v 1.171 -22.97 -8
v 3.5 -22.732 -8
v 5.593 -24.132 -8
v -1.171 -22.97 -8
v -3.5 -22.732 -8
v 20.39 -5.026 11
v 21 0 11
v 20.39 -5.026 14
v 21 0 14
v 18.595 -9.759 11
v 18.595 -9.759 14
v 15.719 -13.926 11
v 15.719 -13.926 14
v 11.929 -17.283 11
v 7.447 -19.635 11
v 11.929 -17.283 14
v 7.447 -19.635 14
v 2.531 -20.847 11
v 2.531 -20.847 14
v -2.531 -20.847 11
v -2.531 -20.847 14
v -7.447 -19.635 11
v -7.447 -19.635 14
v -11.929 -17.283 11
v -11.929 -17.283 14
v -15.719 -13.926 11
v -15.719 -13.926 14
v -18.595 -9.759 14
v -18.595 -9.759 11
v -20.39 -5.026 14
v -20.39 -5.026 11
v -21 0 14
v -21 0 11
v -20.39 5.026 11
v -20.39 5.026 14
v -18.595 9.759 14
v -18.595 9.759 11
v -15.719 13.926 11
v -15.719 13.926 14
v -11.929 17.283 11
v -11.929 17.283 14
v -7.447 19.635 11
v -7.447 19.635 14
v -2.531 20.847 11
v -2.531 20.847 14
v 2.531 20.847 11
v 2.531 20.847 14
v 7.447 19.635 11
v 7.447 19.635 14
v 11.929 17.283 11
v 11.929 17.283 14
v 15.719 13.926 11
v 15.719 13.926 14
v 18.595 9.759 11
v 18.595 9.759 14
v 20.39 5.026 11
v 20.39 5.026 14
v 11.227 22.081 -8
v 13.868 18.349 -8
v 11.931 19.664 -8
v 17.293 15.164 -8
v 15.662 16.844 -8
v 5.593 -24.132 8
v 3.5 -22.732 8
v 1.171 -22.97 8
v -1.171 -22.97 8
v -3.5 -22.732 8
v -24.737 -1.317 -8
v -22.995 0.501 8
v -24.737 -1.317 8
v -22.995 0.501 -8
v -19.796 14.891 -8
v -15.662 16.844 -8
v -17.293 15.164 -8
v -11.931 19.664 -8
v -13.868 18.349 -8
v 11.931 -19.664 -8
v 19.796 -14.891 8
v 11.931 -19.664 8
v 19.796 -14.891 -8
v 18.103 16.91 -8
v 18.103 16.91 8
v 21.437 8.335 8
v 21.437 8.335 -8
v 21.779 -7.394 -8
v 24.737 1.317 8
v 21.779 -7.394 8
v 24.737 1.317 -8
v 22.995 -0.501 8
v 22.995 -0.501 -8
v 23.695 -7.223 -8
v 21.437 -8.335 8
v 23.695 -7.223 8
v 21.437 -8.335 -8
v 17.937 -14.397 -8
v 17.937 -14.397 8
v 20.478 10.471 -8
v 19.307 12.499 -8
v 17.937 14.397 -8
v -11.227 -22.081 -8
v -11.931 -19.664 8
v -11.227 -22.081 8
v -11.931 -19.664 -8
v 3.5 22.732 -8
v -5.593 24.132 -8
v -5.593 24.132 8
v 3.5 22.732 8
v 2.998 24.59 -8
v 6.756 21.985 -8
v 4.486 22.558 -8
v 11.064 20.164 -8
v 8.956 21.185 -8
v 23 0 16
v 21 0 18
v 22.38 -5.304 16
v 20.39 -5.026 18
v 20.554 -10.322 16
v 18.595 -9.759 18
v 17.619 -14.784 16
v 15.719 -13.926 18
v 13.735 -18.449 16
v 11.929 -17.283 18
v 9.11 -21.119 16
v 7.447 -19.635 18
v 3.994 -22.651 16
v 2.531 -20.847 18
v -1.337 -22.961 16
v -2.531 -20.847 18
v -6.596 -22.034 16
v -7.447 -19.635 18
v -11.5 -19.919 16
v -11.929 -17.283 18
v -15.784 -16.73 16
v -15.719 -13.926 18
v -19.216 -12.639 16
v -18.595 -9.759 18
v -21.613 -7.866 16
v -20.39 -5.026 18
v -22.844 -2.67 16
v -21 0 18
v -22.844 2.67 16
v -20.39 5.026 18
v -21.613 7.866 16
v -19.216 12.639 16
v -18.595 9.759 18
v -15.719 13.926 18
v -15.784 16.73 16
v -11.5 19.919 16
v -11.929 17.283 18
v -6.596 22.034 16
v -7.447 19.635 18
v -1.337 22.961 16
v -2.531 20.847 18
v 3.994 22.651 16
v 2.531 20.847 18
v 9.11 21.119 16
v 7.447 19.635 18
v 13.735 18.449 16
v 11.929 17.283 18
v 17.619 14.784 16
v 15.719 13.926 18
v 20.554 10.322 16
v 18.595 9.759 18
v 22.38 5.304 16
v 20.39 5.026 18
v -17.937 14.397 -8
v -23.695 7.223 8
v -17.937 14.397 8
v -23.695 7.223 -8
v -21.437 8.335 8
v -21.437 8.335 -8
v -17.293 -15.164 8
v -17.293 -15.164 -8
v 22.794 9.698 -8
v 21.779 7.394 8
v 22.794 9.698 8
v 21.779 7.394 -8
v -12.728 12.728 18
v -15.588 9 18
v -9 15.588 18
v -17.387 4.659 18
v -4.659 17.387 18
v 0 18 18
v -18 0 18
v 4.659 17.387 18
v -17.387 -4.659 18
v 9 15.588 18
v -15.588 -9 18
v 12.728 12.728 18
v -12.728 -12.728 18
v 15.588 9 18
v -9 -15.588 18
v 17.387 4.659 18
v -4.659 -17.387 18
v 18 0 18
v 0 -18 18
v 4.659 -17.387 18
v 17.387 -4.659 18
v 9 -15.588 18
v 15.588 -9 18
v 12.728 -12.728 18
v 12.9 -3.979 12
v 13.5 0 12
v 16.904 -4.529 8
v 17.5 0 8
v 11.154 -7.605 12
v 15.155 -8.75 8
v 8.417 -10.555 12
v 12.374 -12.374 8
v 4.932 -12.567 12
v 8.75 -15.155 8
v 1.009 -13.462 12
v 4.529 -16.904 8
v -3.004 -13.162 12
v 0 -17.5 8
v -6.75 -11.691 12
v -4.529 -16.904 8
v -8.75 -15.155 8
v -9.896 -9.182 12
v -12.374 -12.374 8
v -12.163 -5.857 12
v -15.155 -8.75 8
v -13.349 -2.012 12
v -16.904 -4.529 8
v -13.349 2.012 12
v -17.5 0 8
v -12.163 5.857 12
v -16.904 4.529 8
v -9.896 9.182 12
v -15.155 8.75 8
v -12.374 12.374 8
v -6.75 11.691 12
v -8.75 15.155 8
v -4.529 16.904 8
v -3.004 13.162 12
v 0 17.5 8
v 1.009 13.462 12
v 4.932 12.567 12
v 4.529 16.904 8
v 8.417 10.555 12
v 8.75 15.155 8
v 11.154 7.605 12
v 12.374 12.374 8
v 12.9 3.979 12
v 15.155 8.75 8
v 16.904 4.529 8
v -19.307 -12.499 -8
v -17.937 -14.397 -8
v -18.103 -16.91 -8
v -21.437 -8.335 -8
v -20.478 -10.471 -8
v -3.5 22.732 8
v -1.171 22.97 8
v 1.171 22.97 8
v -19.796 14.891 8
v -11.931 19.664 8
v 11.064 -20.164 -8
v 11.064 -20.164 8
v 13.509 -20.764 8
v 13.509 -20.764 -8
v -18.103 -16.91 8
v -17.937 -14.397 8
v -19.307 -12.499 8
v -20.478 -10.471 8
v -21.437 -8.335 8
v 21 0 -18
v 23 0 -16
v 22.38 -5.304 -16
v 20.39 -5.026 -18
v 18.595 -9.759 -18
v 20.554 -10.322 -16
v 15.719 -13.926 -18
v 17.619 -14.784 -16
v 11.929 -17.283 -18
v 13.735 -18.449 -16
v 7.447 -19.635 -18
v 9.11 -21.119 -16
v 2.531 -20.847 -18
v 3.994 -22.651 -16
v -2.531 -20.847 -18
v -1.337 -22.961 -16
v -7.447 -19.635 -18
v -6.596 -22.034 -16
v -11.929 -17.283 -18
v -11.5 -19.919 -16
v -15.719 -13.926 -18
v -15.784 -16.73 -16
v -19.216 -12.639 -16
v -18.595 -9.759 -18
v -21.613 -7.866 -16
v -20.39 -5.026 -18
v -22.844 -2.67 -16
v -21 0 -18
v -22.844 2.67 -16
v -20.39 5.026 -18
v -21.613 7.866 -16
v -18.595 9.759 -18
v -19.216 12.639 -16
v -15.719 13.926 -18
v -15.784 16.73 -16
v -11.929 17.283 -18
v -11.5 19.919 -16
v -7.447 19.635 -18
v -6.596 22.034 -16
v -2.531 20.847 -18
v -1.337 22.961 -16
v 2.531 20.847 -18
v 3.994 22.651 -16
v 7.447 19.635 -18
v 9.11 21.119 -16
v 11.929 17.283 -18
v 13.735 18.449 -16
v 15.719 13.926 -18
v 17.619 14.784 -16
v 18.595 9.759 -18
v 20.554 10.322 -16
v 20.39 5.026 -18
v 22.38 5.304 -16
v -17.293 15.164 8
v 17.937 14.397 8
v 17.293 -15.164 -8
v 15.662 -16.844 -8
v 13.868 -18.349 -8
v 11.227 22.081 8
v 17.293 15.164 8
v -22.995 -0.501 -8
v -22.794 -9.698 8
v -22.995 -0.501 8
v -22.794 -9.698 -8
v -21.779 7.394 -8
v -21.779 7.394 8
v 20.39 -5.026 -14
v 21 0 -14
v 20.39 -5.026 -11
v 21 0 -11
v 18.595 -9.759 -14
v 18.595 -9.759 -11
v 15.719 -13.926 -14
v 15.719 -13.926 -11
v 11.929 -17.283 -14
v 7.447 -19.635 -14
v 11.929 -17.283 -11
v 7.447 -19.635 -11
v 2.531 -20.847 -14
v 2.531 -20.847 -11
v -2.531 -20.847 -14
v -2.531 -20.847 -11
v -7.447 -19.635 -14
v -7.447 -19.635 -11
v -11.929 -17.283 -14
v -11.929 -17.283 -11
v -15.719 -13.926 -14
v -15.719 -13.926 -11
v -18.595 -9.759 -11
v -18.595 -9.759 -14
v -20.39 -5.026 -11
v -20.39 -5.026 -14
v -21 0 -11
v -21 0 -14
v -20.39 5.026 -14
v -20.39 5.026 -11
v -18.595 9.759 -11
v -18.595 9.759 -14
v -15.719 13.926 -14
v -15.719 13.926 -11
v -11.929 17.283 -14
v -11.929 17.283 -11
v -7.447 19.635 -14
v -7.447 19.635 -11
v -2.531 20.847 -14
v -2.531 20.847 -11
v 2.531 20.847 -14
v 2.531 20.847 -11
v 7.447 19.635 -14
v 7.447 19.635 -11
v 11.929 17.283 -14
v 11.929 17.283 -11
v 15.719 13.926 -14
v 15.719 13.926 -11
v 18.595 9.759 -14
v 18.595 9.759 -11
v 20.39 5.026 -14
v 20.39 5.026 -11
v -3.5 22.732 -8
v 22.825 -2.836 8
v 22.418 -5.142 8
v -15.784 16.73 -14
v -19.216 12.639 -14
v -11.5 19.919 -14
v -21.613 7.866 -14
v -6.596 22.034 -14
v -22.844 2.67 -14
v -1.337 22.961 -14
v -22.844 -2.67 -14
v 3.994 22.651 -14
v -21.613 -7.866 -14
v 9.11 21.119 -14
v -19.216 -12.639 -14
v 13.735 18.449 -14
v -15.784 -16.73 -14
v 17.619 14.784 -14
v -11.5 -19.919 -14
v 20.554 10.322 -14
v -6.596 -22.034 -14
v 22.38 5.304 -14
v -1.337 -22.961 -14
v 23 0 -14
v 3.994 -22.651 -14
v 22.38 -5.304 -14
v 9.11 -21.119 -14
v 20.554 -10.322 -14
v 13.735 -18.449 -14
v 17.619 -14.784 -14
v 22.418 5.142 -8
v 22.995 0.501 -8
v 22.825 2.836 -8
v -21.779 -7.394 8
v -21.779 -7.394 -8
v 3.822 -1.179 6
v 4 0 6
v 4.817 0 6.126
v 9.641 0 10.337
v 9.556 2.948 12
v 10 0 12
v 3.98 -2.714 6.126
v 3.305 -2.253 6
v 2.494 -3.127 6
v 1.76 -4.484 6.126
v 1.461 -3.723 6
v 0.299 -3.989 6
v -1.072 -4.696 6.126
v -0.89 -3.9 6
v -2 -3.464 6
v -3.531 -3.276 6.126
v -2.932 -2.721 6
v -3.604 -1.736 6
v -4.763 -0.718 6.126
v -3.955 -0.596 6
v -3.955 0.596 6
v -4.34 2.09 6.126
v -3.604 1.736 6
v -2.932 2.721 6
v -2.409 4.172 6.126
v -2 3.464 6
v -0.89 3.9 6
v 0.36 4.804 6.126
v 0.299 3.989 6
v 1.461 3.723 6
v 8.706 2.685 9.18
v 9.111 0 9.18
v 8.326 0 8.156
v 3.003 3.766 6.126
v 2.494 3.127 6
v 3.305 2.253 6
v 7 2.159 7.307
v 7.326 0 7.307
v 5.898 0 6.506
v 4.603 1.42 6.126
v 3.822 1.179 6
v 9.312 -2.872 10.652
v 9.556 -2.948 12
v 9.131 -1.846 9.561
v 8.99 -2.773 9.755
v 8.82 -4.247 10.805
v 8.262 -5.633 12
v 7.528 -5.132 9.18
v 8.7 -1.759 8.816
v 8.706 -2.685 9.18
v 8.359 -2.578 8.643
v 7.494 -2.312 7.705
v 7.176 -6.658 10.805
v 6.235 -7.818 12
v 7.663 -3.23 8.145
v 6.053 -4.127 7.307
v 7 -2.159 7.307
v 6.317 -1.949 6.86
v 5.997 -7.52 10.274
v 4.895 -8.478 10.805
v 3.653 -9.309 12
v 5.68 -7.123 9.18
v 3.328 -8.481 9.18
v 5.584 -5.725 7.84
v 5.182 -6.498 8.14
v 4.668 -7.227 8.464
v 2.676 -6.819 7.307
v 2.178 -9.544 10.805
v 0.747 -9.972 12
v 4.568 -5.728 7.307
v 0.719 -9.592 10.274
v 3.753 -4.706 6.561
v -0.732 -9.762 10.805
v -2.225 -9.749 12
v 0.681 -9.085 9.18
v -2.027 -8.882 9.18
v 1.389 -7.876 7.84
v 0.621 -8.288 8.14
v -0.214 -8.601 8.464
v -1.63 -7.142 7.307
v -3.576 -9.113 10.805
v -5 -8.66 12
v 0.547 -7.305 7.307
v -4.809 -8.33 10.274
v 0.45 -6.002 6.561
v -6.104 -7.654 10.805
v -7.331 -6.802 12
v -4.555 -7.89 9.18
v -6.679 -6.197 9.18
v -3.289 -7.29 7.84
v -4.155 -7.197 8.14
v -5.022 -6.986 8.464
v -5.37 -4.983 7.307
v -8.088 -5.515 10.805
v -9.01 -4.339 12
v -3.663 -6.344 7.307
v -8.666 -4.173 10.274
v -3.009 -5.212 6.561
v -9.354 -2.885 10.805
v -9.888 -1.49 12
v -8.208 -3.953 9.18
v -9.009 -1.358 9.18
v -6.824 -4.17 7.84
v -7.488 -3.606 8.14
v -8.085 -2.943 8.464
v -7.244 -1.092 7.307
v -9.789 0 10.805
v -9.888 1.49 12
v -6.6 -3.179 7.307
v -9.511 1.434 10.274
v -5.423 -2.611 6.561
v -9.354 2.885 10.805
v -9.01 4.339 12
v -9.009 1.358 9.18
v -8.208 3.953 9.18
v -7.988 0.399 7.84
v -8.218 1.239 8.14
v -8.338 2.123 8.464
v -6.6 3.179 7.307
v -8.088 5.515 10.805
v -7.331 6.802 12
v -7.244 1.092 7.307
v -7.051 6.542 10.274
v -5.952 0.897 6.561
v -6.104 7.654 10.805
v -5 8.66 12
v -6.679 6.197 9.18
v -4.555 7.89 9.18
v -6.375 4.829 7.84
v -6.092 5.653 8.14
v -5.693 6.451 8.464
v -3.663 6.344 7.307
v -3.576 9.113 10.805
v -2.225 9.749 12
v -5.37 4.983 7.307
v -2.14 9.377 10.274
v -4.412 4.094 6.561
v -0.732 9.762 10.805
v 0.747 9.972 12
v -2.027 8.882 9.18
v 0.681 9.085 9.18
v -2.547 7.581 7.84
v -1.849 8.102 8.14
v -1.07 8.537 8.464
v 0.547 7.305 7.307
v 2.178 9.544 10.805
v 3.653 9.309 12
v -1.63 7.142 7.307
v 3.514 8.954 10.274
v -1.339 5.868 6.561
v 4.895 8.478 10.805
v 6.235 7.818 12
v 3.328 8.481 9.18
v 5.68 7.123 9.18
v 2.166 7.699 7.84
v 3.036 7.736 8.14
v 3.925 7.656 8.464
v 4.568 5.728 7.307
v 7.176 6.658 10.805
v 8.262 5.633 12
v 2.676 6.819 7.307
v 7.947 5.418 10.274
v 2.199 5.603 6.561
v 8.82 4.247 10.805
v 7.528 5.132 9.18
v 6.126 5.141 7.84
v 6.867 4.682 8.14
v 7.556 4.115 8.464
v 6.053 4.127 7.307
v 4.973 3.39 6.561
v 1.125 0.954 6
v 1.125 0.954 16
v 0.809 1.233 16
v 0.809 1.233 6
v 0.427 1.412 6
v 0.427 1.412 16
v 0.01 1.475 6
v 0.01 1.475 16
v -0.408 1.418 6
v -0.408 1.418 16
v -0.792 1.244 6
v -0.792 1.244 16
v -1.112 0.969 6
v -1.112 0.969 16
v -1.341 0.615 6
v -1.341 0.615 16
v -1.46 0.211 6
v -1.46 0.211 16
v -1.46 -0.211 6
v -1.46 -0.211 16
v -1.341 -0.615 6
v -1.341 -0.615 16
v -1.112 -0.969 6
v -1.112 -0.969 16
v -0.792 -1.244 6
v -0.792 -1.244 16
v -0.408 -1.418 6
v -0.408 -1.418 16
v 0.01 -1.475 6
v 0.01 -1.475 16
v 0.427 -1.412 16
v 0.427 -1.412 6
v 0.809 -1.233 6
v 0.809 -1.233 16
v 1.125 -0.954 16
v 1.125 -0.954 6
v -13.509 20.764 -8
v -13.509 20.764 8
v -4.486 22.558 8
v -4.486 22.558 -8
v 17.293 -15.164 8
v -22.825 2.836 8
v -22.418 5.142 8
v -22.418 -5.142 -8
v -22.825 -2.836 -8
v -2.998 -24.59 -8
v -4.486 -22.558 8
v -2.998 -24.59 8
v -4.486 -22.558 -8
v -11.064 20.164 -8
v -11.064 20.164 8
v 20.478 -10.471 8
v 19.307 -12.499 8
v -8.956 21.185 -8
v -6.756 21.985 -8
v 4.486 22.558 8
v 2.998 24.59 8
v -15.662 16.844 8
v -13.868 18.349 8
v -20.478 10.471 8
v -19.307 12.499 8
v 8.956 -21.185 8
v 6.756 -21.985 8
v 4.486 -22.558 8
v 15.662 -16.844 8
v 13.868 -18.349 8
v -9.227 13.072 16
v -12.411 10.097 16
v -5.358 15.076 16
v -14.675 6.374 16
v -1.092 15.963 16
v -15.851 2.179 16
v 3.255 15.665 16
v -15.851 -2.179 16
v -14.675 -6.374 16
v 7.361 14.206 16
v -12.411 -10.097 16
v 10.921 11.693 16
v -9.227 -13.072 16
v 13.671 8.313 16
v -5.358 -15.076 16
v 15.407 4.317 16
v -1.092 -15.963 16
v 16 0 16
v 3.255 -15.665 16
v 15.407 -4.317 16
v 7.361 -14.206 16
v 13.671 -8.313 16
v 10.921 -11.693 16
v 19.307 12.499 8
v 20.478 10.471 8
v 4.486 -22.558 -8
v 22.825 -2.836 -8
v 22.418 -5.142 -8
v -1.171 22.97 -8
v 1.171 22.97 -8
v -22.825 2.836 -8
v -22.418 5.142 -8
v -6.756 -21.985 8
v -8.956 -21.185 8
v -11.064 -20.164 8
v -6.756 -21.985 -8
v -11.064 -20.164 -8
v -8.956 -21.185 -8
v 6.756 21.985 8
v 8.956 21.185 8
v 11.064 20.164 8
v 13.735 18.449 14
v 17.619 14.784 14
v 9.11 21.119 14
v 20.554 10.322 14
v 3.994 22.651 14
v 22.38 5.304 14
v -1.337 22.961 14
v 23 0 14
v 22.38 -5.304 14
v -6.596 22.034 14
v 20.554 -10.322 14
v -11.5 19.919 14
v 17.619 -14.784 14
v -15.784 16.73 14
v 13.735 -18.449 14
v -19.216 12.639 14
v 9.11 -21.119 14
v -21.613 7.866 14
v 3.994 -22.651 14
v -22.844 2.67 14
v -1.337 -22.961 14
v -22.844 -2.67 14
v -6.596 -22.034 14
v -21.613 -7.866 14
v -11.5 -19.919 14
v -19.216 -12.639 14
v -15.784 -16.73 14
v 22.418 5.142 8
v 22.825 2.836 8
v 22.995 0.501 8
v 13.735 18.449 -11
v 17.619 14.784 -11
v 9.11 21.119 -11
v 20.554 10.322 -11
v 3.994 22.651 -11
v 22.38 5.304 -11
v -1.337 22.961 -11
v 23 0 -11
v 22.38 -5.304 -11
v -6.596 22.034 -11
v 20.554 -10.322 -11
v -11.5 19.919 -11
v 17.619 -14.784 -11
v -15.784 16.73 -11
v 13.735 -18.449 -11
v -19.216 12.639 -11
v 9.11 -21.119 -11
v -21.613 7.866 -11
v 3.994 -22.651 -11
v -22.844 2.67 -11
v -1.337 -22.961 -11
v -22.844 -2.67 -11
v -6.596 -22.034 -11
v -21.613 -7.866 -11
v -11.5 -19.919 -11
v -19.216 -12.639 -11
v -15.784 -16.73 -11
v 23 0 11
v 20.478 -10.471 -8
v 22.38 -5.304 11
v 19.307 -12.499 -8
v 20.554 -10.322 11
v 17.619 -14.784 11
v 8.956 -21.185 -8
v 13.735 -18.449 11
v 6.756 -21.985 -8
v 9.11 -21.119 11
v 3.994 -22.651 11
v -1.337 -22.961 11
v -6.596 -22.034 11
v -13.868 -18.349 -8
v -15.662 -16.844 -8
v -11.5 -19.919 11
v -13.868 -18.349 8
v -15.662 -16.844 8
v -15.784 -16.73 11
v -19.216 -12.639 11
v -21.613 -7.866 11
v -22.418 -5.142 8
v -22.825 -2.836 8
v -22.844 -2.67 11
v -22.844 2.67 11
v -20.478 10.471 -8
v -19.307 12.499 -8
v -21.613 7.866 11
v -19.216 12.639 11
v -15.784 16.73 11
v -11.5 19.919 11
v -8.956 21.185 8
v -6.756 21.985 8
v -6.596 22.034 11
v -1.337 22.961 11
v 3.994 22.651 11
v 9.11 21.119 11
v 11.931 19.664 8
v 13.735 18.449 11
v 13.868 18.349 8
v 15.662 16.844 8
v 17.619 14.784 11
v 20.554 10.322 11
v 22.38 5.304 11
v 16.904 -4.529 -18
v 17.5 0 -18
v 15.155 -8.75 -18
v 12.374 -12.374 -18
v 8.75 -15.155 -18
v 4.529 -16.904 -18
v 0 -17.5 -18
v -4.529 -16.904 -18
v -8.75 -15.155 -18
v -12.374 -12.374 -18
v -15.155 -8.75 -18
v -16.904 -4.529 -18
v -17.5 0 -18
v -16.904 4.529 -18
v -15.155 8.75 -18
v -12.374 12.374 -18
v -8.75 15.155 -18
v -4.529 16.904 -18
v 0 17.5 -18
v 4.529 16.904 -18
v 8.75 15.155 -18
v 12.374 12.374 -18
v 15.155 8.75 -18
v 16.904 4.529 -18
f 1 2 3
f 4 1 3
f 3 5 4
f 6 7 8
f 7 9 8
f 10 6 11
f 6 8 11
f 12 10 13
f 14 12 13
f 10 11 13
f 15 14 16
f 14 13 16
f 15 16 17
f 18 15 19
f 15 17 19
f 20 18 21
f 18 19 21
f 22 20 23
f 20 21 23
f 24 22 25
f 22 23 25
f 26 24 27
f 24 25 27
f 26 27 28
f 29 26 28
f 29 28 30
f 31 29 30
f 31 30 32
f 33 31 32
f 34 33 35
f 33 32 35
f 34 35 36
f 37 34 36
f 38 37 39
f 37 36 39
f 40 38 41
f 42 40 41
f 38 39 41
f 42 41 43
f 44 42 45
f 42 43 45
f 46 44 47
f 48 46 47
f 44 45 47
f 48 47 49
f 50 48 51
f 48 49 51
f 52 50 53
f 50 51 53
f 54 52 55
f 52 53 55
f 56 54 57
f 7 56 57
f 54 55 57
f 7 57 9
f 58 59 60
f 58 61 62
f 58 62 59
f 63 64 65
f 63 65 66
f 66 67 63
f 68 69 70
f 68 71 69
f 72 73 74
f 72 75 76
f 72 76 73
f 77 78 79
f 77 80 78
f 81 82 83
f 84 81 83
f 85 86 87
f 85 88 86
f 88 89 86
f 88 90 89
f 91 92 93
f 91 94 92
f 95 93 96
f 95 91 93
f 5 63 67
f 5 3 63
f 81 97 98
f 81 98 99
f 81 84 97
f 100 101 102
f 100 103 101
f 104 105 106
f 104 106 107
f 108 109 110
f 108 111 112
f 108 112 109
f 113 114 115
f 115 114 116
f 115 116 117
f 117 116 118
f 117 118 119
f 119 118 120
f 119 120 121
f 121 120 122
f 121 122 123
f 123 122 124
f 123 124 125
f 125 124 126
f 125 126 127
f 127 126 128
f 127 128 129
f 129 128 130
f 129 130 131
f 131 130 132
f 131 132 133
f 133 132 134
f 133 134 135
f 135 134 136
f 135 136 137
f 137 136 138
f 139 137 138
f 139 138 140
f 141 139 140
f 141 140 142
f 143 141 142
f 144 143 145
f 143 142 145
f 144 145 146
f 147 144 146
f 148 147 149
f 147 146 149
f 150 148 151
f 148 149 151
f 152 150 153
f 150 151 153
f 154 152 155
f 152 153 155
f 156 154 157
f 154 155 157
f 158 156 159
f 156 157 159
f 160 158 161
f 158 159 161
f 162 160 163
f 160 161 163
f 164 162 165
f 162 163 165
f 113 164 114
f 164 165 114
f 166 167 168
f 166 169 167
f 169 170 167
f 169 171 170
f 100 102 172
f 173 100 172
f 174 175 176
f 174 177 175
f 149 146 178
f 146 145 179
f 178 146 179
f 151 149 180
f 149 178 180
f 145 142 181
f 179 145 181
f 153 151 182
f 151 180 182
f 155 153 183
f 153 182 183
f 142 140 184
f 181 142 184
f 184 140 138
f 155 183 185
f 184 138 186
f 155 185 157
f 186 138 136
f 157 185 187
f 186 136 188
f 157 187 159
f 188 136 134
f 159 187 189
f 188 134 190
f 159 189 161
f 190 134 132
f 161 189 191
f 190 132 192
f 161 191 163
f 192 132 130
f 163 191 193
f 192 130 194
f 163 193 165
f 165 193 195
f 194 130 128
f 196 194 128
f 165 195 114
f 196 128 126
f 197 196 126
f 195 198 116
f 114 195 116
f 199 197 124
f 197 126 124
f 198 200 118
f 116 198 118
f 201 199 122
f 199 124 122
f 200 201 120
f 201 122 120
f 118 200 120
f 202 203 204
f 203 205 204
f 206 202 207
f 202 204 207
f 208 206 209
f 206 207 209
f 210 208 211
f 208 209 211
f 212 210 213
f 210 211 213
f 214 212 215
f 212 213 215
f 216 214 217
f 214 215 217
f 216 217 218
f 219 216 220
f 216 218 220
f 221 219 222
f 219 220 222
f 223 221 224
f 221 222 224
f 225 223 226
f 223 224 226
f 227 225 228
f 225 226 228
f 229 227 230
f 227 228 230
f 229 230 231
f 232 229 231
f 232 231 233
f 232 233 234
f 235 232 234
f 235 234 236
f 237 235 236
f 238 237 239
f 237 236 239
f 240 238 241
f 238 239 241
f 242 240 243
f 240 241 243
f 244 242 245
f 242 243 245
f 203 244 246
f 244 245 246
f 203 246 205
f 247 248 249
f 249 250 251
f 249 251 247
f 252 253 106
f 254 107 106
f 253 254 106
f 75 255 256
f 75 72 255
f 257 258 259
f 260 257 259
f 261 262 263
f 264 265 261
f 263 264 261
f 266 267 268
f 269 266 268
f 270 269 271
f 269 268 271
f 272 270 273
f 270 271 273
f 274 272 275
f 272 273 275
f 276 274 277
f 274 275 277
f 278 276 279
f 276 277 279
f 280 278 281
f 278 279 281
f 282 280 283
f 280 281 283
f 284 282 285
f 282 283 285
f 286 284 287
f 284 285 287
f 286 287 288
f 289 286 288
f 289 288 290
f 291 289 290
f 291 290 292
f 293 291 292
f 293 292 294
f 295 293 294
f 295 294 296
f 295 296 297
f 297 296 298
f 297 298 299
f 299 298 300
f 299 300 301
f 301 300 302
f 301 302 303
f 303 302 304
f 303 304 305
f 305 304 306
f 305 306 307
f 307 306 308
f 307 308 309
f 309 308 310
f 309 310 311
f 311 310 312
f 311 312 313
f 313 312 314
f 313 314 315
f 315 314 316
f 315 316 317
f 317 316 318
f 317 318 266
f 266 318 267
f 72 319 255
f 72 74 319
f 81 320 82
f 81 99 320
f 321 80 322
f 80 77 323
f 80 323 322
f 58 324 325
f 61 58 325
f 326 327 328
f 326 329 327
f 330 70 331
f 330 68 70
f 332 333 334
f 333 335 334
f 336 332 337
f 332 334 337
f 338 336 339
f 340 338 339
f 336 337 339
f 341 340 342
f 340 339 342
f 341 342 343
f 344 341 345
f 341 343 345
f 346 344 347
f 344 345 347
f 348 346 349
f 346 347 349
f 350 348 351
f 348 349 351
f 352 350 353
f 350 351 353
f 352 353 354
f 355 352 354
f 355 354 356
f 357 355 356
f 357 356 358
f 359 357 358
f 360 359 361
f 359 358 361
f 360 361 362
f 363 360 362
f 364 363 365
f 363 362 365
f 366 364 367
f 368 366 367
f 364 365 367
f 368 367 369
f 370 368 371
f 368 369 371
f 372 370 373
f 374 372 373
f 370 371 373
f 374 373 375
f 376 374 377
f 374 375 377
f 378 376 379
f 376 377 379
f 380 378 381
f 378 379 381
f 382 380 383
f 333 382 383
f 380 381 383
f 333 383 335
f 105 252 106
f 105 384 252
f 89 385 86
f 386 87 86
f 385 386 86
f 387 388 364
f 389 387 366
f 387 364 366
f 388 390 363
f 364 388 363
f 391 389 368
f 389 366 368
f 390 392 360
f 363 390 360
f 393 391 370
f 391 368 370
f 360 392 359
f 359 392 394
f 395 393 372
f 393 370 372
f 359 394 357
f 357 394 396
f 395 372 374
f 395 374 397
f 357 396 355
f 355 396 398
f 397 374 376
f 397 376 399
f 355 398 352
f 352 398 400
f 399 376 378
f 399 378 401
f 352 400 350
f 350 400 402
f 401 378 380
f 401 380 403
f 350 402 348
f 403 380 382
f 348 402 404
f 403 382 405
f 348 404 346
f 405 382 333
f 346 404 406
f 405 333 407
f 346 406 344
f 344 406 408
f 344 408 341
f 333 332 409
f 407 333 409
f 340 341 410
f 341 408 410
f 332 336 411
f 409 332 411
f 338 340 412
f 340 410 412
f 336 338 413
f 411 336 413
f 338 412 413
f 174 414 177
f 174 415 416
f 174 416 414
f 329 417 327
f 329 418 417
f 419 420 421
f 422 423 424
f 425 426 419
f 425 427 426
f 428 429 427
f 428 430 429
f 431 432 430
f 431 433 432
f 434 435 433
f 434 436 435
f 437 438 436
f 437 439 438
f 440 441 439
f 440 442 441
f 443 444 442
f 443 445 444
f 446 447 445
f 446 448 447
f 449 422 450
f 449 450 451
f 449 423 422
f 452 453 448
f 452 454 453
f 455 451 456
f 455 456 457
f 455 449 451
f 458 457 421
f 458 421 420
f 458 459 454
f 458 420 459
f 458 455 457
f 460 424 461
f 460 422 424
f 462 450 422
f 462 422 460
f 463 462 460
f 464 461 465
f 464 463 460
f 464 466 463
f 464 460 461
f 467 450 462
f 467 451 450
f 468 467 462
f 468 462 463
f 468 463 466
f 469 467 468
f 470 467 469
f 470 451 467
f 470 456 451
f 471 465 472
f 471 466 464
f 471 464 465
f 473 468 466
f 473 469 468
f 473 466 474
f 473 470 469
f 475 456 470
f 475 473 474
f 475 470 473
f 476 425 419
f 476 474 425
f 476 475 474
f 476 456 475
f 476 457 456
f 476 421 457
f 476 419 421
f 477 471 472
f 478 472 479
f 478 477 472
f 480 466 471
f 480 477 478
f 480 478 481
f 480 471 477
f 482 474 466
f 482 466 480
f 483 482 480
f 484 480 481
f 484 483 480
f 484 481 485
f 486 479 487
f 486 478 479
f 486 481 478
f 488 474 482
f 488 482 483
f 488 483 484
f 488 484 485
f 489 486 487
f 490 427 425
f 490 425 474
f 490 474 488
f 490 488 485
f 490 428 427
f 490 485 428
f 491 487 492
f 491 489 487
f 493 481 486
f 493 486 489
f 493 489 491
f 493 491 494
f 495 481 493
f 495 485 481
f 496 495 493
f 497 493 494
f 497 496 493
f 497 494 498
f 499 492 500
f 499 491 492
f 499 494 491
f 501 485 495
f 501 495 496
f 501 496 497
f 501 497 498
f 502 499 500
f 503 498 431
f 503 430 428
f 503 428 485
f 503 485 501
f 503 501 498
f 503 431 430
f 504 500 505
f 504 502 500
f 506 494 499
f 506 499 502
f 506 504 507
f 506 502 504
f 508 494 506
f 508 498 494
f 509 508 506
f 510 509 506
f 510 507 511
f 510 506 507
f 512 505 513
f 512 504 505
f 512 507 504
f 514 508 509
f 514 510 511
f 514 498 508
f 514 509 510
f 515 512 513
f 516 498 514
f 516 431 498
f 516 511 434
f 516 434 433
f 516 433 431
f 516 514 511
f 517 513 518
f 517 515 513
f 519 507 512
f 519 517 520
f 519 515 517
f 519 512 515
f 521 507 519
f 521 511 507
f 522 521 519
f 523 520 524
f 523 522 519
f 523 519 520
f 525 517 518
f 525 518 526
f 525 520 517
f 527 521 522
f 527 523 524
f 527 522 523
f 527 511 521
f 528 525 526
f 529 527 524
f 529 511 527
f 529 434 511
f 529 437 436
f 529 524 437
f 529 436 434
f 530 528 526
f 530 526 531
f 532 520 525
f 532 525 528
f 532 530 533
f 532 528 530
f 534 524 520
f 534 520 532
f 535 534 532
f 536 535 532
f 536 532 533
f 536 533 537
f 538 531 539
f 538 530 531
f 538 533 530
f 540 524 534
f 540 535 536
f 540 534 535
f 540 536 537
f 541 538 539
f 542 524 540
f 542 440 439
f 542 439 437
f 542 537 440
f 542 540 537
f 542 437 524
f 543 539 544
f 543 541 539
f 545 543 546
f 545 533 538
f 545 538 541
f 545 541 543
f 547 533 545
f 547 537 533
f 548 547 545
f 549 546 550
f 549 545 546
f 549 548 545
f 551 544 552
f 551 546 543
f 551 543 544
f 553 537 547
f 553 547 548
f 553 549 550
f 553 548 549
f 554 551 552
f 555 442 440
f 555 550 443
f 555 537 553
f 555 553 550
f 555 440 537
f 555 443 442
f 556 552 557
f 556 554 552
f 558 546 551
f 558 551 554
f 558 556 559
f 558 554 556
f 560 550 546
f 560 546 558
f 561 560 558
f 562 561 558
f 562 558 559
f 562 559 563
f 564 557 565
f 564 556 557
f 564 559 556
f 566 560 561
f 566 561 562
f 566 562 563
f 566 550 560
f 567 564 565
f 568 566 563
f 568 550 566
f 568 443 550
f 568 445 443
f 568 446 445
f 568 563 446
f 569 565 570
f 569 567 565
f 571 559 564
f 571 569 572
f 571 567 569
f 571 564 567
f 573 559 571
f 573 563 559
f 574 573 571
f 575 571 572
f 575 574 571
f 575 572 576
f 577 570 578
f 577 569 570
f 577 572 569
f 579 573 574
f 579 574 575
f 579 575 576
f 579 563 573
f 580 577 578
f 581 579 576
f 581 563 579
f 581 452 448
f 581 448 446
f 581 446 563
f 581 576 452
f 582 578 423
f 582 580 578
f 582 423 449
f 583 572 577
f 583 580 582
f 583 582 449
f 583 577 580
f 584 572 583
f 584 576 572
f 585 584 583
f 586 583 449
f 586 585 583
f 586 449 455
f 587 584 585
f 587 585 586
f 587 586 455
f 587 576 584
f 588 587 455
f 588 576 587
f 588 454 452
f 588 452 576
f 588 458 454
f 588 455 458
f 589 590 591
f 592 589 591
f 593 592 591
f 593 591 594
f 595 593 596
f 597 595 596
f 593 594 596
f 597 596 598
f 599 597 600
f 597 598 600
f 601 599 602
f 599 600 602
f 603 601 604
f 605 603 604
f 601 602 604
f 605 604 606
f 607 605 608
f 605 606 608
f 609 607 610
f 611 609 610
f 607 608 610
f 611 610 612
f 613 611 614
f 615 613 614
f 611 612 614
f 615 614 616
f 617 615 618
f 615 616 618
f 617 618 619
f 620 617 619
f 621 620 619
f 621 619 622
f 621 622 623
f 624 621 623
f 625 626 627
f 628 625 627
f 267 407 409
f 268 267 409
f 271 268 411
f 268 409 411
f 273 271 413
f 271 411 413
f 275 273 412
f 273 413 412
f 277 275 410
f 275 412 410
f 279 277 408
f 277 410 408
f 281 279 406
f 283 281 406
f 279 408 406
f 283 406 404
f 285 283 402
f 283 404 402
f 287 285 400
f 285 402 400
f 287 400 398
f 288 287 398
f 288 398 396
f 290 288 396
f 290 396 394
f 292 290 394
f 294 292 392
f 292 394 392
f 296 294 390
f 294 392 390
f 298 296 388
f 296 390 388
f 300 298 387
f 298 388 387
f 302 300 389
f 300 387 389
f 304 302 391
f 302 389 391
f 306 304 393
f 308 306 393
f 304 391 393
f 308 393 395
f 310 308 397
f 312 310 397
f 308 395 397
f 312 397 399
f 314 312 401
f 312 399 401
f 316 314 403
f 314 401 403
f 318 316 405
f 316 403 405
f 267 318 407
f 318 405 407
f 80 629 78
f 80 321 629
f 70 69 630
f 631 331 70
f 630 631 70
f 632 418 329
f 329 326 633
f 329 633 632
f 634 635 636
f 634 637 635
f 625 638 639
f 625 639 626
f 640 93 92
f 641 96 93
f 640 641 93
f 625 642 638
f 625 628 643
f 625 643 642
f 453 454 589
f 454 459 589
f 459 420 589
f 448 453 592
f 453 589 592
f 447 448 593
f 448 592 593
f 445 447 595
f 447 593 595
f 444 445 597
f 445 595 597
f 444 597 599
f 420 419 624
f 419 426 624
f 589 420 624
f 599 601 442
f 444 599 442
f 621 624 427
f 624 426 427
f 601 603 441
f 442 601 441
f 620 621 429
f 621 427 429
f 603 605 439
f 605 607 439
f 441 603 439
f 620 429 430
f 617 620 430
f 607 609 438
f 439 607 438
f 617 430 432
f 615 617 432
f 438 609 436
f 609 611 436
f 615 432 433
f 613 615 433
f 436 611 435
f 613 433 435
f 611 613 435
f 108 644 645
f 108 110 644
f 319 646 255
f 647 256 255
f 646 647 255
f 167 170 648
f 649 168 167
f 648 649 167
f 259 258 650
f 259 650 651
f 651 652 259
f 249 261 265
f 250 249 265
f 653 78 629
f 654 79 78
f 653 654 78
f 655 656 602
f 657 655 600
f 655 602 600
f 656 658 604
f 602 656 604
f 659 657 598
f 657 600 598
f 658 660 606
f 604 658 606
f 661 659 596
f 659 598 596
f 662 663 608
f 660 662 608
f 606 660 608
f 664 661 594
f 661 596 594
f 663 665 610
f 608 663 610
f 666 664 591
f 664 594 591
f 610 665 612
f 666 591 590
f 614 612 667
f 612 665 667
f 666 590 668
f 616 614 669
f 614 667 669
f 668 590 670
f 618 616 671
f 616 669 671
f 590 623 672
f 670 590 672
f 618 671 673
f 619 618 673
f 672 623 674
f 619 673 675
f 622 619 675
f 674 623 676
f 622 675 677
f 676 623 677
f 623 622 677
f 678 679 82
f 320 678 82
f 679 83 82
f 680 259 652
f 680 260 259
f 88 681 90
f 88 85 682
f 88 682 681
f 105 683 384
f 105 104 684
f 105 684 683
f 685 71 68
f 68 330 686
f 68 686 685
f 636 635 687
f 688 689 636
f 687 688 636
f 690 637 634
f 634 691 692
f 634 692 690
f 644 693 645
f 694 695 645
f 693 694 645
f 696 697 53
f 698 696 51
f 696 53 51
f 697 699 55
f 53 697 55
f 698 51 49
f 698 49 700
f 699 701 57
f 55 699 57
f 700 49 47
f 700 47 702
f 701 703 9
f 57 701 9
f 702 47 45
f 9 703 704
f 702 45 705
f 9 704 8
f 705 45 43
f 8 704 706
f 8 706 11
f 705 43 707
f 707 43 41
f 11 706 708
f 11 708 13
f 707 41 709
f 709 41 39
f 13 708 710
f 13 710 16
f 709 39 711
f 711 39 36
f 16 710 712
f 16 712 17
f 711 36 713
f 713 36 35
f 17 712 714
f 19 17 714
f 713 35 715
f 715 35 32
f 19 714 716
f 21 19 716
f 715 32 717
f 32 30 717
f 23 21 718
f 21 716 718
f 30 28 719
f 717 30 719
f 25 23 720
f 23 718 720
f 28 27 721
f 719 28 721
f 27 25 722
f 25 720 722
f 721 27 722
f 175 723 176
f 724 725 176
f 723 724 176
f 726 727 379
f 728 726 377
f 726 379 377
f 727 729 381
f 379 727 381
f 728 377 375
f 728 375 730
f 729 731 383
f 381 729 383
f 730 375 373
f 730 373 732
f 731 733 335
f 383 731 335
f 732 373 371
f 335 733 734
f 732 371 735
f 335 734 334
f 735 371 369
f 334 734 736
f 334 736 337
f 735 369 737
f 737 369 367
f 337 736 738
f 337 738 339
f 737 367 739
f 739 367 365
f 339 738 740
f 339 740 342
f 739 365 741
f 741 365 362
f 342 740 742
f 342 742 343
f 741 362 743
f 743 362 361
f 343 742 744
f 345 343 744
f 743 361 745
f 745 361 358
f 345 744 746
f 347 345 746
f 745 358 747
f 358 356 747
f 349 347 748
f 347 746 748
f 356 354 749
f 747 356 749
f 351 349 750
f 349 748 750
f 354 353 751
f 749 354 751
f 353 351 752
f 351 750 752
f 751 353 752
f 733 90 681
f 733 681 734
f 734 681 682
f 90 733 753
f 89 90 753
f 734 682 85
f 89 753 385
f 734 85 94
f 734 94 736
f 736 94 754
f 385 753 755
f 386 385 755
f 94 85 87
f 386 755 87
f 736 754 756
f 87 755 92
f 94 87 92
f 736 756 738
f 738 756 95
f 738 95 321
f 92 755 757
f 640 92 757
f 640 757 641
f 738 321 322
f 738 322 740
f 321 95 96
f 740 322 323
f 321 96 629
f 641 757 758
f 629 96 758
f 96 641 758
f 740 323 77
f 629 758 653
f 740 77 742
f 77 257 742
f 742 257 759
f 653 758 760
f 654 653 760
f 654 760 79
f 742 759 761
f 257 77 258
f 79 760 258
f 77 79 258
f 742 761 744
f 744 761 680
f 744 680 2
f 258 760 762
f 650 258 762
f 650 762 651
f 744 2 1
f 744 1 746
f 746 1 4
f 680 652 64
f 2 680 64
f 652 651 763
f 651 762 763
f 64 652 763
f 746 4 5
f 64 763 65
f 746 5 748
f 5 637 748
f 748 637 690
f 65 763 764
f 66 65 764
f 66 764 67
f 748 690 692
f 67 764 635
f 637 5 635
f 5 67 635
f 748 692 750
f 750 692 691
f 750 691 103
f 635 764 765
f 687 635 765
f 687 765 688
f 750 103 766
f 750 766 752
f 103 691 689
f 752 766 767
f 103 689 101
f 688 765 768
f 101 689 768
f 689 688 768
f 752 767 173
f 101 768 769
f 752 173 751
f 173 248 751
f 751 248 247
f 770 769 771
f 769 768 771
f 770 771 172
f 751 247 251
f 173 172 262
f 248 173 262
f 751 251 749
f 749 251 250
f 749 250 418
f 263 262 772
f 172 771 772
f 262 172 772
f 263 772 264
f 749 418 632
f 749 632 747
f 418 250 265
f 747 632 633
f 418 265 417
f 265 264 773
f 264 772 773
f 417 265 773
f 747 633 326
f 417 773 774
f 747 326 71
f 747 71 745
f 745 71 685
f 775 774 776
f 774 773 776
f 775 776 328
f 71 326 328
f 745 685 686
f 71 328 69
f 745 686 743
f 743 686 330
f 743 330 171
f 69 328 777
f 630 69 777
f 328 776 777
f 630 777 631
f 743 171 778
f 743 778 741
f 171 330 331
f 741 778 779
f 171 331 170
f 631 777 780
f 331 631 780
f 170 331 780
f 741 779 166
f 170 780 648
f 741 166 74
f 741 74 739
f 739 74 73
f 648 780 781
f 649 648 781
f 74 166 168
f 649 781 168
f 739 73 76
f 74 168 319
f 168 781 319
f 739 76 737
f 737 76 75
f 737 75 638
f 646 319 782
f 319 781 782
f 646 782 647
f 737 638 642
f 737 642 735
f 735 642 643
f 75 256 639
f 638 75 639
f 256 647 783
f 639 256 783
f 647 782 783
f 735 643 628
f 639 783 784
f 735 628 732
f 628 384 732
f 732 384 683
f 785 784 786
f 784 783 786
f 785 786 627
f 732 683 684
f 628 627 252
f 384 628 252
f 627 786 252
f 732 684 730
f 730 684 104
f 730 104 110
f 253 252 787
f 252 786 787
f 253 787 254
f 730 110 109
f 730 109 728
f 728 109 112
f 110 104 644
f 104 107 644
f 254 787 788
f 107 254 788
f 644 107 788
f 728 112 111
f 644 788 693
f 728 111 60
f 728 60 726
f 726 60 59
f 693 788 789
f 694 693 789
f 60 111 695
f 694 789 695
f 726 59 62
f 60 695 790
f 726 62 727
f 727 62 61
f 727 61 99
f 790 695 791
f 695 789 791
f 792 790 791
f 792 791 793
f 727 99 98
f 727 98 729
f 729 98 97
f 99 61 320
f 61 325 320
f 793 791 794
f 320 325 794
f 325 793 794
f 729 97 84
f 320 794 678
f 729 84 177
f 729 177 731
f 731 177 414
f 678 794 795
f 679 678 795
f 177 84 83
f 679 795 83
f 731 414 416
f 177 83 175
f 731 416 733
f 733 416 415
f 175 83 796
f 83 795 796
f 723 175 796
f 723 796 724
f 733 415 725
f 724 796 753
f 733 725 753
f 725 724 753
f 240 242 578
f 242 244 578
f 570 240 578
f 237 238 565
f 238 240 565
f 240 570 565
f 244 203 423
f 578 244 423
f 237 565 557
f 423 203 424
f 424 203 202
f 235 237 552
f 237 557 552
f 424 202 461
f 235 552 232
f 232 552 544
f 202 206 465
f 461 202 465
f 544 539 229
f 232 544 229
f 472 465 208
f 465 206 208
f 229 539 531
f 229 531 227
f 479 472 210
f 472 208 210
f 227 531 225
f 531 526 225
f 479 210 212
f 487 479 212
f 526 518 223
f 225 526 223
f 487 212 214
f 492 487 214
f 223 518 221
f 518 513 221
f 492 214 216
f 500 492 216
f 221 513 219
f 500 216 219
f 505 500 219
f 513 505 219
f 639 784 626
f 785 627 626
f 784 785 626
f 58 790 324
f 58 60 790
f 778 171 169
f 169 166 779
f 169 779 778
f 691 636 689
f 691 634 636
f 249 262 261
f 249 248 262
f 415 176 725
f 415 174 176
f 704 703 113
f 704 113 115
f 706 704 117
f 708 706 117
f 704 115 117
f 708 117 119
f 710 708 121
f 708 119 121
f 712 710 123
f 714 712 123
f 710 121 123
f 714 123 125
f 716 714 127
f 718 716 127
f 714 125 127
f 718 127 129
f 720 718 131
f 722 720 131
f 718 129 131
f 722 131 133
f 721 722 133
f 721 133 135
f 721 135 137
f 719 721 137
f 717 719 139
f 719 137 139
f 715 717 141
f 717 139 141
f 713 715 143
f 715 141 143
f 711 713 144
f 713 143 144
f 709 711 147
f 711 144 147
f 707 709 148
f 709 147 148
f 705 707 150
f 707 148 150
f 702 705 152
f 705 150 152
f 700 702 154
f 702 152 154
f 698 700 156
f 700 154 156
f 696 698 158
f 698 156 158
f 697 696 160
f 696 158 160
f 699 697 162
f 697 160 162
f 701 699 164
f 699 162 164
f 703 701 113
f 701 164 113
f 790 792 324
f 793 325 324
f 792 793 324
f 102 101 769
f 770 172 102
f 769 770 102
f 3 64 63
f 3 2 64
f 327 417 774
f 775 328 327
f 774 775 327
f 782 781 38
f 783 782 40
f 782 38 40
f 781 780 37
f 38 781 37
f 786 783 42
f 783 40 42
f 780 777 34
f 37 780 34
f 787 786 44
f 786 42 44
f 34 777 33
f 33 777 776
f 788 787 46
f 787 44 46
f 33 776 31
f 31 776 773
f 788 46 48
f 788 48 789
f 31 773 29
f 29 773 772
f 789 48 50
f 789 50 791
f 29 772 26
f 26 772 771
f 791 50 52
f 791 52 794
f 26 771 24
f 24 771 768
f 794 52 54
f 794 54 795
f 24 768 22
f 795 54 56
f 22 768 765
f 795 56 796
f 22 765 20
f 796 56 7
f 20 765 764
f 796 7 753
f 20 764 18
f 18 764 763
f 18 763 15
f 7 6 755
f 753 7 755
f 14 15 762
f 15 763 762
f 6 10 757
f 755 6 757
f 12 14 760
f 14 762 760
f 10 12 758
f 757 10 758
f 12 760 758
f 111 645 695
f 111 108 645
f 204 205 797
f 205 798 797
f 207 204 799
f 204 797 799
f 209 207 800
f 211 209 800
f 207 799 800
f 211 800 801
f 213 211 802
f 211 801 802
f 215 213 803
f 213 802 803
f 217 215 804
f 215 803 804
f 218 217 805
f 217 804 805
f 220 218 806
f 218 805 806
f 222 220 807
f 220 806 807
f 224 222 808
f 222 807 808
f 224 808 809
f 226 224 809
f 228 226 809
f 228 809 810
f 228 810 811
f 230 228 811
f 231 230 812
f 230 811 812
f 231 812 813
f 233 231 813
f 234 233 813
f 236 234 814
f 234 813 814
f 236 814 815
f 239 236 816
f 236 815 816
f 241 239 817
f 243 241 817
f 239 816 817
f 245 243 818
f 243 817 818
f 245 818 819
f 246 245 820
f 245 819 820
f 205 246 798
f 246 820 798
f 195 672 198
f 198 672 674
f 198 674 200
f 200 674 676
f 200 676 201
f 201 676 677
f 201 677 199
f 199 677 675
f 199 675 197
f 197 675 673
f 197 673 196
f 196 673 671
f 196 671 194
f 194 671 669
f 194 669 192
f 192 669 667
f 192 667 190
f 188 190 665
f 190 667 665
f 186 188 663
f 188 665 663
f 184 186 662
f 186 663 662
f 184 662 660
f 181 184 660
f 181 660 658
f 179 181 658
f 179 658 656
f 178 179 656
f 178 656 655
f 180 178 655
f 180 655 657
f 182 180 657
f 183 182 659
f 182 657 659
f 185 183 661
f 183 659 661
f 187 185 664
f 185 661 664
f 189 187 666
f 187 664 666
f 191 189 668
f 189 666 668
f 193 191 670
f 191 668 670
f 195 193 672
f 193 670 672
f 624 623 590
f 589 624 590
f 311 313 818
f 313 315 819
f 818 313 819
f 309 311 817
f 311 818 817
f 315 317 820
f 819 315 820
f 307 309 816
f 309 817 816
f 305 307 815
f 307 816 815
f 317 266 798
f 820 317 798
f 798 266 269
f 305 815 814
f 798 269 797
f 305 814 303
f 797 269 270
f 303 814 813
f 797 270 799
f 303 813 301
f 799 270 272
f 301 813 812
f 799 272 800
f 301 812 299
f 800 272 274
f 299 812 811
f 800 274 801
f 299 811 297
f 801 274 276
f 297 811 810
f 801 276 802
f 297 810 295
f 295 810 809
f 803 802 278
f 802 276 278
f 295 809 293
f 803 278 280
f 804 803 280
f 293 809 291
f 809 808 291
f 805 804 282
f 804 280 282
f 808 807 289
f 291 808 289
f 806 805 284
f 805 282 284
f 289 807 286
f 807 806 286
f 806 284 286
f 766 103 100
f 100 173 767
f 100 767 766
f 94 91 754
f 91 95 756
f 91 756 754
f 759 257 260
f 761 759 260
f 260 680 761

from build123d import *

# Parameters (mm, degrees)
CUT_EXTRUDE_1_DEPTH = 48.053161424
EXTRUDE_1_DEPTH     = 8


with BuildPart() as part:
    # Эскиз1 → Повернуть1 (revolve)
    with BuildSketch(Plane(origin=(0, 0, 0), x_dir=(0, 0, -1), z_dir=(1, 0, 0))):
        with BuildLine():
            Line((16, 23), (0, 23))
            Line((0, 23), (-16, 23))
            Line((-16, 23), (-18, 21))
            Line((-18, 21), (-18, 18))
            Line((-18, 18), (-16, 16))
            Line((-16, 16), (-16, 0))
            Line((-16, 0), (-14.334262465, 0))
            Line((-14.334262465, 0), (-6, 0))
            Line((-6, 0), (-6, 4))
            add(Edge.make_bspline(
                [(-12, 10), (-11.486384316, 10), (-7.521156143, 9.156929615), (-6, 5.021272174), (-6, 4)],
                knots=[0, 0, 0, 0, 0.351628705, 1, 1, 1, 1], degree=3))
            Line((-12, 10), (-12, 13.5))
            Line((-12, 13.5), (-8, 17.5))
            Line((-8, 17.5), (18, 17.5))
            Line((18, 17.5), (18, 21))
            Line((18, 21), (16, 23))
        make_face()
    revolve(axis=Axis((0, 0, 28.673920663), (0, 0, -1)))

    # Эскиз2 → Вырез-Вытянуть1 (cut, through all)
    with BuildSketch(Plane.XY.offset(16)):
        with BuildLine():
            Line((1.125, -0.953939201), (1.125, 0.953939201))
            ThreePointArc((1.125, 0.953939201), (-1.475, 0), (1.125, -0.953939201))
        make_face()
    extrude(amount=-CUT_EXTRUDE_1_DEPTH, mode=Mode.SUBTRACT)

    # Эскиз3 → Вырез-Повернуть1 (revolve, cut)
    with BuildSketch(Plane(origin=(0, 0, 0), x_dir=(0, 0, -1), z_dir=(1, 0, 0))):
        Polygon((18, 21), (16, 23), (14, 23), (14, 21), (11, 21), (11, 23), (-11, 23), (-11, 21), (-14, 21), (-14, 23), (-16, 23), (-18, 21), (-18, 24.334722486), (18, 24.334722486), align=None)
    revolve(axis=Axis((0, 0, 27.637589676), (0, 0, -1)), mode=Mode.SUBTRACT)

    # Эскиз4 → Бобышка-Вытянуть1 (add, symmetric)
    with BuildSketch(Plane.XY):
        with BuildLine():
            Line((-3.5, 22.732135843), (-5.592854337, 24.132135843))
            Line((-5.592854337, 24.132135843), (3.5, 22.732135843))
            ThreePointArc((3.5, 22.732135843), (0, 23), (-3.5, 22.732135843))
        make_face()
        with BuildLine():
            Line((2.99811261, 24.589658818), (11.063772532, 20.164149805))
            ThreePointArc((11.063772532, 20.164149805), (7.866463296, 21.612930278), (4.485924186, 22.558290808))
            Line((4.485924186, 22.558290808), (2.99811261, 24.589658818))
        make_face()
        with BuildLine():
            Line((11.227462929, 22.081306034), (17.293090813, 15.164069709))
            ThreePointArc((17.293090813, 15.164069709), (14.784115023, 17.619022192), (11.930779711, 19.663582977))
            Line((11.930779711, 19.663582977), (11.227462929, 22.081306034))
        make_face()
        with BuildLine():
            Line((18.102615519, 16.909621857), (21.436607123, 8.334979008))
            ThreePointArc((21.436607123, 8.334979008), (19.918584287, 11.5), (17.936607123, 14.397156835))
            Line((17.936607123, 14.397156835), (18.102615519, 16.909621857))
        make_face()
        with BuildLine():
            Line((22.794325512, 9.698387725), (22.994552243, 0.500566828))
            ThreePointArc((22.994552243, 0.500566828), (22.650578319, 3.993908086), (21.779014999, 7.394221099))
            Line((21.779014999, 7.394221099), (22.794325512, 9.698387725))
        make_face()
        with BuildLine():
            Line((24.736703439, 1.3173849), (21.779014999, -7.394221099))
            ThreePointArc((21.779014999, -7.394221099), (22.650578319, -3.993908086), (22.994552243, -0.500566828))
            Line((22.994552243, -0.500566828), (24.736703439, 1.3173849))
        make_face()
        with BuildLine():
            Line((23.695469857, -7.222513986), (17.936607123, -14.397156835))
            ThreePointArc((17.936607123, -14.397156835), (19.918584287, -11.5), (21.436607123, -8.334979008))
            Line((21.436607123, -8.334979008), (23.695469857, -7.222513986))
        make_face()
        with BuildLine():
            Line((19.796212902, -14.891271093), (11.930779711, -19.663582977))
            ThreePointArc((11.930779711, -19.663582977), (14.784115023, -17.619022192), (17.293090813, -15.164069709))
            Line((17.293090813, -15.164069709), (19.796212902, -14.891271093))
        make_face()
        with BuildLine():
            Line((13.50924051, -20.763921134), (4.485924186, -22.558290808))
            ThreePointArc((4.485924186, -22.558290808), (7.866463296, -21.612930278), (11.063772532, -20.164149805))
            Line((11.063772532, -20.164149805), (13.50924051, -20.763921134))
        make_face()
        with BuildLine():
            Line((5.592854337, -24.132135843), (-3.5, -22.732135843))
            ThreePointArc((-3.5, -22.732135843), (0, -23), (3.5, -22.732135843))
            Line((3.5, -22.732135843), (5.592854337, -24.132135843))
        make_face()
        with BuildLine():
            Line((-2.99811261, -24.589658818), (-11.063772532, -20.164149805))
            ThreePointArc((-11.063772532, -20.164149805), (-7.866463296, -21.612930278), (-4.485924186, -22.558290808))
            Line((-4.485924186, -22.558290808), (-2.99811261, -24.589658818))
        make_face()
        with BuildLine():
            Line((-11.227462929, -22.081306034), (-17.293090813, -15.164069709))
            ThreePointArc((-17.293090813, -15.164069709), (-14.784115023, -17.619022192), (-11.930779711, -19.663582977))
            Line((-11.930779711, -19.663582977), (-11.227462929, -22.081306034))
        make_face()
        with BuildLine():
            Line((-18.102615519, -16.909621857), (-21.436607123, -8.334979008))
            ThreePointArc((-21.436607123, -8.334979008), (-19.918584287, -11.5), (-17.936607123, -14.397156835))
            Line((-17.936607123, -14.397156835), (-18.102615519, -16.909621857))
        make_face()
        with BuildLine():
            Line((-22.794325512, -9.698387725), (-22.994552243, -0.500566828))
            ThreePointArc((-22.994552243, -0.500566828), (-22.650578319, -3.993908086), (-21.779014999, -7.394221099))
            Line((-21.779014999, -7.394221099), (-22.794325512, -9.698387725))
        make_face()
        with BuildLine():
            Line((-24.736703439, -1.3173849), (-21.779014999, 7.394221099))
            ThreePointArc((-21.779014999, 7.394221099), (-22.650578319, 3.993908086), (-22.994552243, 0.500566828))
            Line((-22.994552243, 0.500566828), (-24.736703439, -1.3173849))
        make_face()
        with BuildLine():
            Line((-23.695469857, 7.222513986), (-17.936607123, 14.397156835))
            ThreePointArc((-17.936607123, 14.397156835), (-19.918584287, 11.5), (-21.436607123, 8.334979008))
            Line((-21.436607123, 8.334979008), (-23.695469857, 7.222513986))
        make_face()
        with BuildLine():
            Line((-19.796212902, 14.891271093), (-11.930779711, 19.663582977))
            ThreePointArc((-11.930779711, 19.663582977), (-14.784115023, 17.619022192), (-17.293090813, 15.164069709))
            Line((-17.293090813, 15.164069709), (-19.796212902, 14.891271093))
        make_face()
        with BuildLine():
            Line((-13.50924051, 20.763921134), (-4.485924186, 22.558290808))
            ThreePointArc((-4.485924186, 22.558290808), (-7.866463296, 21.612930278), (-11.063772532, 20.164149805))
            Line((-11.063772532, 20.164149805), (-13.50924051, 20.763921134))
        make_face()
    extrude(amount=EXTRUDE_1_DEPTH, both=True)


solid = part.part
